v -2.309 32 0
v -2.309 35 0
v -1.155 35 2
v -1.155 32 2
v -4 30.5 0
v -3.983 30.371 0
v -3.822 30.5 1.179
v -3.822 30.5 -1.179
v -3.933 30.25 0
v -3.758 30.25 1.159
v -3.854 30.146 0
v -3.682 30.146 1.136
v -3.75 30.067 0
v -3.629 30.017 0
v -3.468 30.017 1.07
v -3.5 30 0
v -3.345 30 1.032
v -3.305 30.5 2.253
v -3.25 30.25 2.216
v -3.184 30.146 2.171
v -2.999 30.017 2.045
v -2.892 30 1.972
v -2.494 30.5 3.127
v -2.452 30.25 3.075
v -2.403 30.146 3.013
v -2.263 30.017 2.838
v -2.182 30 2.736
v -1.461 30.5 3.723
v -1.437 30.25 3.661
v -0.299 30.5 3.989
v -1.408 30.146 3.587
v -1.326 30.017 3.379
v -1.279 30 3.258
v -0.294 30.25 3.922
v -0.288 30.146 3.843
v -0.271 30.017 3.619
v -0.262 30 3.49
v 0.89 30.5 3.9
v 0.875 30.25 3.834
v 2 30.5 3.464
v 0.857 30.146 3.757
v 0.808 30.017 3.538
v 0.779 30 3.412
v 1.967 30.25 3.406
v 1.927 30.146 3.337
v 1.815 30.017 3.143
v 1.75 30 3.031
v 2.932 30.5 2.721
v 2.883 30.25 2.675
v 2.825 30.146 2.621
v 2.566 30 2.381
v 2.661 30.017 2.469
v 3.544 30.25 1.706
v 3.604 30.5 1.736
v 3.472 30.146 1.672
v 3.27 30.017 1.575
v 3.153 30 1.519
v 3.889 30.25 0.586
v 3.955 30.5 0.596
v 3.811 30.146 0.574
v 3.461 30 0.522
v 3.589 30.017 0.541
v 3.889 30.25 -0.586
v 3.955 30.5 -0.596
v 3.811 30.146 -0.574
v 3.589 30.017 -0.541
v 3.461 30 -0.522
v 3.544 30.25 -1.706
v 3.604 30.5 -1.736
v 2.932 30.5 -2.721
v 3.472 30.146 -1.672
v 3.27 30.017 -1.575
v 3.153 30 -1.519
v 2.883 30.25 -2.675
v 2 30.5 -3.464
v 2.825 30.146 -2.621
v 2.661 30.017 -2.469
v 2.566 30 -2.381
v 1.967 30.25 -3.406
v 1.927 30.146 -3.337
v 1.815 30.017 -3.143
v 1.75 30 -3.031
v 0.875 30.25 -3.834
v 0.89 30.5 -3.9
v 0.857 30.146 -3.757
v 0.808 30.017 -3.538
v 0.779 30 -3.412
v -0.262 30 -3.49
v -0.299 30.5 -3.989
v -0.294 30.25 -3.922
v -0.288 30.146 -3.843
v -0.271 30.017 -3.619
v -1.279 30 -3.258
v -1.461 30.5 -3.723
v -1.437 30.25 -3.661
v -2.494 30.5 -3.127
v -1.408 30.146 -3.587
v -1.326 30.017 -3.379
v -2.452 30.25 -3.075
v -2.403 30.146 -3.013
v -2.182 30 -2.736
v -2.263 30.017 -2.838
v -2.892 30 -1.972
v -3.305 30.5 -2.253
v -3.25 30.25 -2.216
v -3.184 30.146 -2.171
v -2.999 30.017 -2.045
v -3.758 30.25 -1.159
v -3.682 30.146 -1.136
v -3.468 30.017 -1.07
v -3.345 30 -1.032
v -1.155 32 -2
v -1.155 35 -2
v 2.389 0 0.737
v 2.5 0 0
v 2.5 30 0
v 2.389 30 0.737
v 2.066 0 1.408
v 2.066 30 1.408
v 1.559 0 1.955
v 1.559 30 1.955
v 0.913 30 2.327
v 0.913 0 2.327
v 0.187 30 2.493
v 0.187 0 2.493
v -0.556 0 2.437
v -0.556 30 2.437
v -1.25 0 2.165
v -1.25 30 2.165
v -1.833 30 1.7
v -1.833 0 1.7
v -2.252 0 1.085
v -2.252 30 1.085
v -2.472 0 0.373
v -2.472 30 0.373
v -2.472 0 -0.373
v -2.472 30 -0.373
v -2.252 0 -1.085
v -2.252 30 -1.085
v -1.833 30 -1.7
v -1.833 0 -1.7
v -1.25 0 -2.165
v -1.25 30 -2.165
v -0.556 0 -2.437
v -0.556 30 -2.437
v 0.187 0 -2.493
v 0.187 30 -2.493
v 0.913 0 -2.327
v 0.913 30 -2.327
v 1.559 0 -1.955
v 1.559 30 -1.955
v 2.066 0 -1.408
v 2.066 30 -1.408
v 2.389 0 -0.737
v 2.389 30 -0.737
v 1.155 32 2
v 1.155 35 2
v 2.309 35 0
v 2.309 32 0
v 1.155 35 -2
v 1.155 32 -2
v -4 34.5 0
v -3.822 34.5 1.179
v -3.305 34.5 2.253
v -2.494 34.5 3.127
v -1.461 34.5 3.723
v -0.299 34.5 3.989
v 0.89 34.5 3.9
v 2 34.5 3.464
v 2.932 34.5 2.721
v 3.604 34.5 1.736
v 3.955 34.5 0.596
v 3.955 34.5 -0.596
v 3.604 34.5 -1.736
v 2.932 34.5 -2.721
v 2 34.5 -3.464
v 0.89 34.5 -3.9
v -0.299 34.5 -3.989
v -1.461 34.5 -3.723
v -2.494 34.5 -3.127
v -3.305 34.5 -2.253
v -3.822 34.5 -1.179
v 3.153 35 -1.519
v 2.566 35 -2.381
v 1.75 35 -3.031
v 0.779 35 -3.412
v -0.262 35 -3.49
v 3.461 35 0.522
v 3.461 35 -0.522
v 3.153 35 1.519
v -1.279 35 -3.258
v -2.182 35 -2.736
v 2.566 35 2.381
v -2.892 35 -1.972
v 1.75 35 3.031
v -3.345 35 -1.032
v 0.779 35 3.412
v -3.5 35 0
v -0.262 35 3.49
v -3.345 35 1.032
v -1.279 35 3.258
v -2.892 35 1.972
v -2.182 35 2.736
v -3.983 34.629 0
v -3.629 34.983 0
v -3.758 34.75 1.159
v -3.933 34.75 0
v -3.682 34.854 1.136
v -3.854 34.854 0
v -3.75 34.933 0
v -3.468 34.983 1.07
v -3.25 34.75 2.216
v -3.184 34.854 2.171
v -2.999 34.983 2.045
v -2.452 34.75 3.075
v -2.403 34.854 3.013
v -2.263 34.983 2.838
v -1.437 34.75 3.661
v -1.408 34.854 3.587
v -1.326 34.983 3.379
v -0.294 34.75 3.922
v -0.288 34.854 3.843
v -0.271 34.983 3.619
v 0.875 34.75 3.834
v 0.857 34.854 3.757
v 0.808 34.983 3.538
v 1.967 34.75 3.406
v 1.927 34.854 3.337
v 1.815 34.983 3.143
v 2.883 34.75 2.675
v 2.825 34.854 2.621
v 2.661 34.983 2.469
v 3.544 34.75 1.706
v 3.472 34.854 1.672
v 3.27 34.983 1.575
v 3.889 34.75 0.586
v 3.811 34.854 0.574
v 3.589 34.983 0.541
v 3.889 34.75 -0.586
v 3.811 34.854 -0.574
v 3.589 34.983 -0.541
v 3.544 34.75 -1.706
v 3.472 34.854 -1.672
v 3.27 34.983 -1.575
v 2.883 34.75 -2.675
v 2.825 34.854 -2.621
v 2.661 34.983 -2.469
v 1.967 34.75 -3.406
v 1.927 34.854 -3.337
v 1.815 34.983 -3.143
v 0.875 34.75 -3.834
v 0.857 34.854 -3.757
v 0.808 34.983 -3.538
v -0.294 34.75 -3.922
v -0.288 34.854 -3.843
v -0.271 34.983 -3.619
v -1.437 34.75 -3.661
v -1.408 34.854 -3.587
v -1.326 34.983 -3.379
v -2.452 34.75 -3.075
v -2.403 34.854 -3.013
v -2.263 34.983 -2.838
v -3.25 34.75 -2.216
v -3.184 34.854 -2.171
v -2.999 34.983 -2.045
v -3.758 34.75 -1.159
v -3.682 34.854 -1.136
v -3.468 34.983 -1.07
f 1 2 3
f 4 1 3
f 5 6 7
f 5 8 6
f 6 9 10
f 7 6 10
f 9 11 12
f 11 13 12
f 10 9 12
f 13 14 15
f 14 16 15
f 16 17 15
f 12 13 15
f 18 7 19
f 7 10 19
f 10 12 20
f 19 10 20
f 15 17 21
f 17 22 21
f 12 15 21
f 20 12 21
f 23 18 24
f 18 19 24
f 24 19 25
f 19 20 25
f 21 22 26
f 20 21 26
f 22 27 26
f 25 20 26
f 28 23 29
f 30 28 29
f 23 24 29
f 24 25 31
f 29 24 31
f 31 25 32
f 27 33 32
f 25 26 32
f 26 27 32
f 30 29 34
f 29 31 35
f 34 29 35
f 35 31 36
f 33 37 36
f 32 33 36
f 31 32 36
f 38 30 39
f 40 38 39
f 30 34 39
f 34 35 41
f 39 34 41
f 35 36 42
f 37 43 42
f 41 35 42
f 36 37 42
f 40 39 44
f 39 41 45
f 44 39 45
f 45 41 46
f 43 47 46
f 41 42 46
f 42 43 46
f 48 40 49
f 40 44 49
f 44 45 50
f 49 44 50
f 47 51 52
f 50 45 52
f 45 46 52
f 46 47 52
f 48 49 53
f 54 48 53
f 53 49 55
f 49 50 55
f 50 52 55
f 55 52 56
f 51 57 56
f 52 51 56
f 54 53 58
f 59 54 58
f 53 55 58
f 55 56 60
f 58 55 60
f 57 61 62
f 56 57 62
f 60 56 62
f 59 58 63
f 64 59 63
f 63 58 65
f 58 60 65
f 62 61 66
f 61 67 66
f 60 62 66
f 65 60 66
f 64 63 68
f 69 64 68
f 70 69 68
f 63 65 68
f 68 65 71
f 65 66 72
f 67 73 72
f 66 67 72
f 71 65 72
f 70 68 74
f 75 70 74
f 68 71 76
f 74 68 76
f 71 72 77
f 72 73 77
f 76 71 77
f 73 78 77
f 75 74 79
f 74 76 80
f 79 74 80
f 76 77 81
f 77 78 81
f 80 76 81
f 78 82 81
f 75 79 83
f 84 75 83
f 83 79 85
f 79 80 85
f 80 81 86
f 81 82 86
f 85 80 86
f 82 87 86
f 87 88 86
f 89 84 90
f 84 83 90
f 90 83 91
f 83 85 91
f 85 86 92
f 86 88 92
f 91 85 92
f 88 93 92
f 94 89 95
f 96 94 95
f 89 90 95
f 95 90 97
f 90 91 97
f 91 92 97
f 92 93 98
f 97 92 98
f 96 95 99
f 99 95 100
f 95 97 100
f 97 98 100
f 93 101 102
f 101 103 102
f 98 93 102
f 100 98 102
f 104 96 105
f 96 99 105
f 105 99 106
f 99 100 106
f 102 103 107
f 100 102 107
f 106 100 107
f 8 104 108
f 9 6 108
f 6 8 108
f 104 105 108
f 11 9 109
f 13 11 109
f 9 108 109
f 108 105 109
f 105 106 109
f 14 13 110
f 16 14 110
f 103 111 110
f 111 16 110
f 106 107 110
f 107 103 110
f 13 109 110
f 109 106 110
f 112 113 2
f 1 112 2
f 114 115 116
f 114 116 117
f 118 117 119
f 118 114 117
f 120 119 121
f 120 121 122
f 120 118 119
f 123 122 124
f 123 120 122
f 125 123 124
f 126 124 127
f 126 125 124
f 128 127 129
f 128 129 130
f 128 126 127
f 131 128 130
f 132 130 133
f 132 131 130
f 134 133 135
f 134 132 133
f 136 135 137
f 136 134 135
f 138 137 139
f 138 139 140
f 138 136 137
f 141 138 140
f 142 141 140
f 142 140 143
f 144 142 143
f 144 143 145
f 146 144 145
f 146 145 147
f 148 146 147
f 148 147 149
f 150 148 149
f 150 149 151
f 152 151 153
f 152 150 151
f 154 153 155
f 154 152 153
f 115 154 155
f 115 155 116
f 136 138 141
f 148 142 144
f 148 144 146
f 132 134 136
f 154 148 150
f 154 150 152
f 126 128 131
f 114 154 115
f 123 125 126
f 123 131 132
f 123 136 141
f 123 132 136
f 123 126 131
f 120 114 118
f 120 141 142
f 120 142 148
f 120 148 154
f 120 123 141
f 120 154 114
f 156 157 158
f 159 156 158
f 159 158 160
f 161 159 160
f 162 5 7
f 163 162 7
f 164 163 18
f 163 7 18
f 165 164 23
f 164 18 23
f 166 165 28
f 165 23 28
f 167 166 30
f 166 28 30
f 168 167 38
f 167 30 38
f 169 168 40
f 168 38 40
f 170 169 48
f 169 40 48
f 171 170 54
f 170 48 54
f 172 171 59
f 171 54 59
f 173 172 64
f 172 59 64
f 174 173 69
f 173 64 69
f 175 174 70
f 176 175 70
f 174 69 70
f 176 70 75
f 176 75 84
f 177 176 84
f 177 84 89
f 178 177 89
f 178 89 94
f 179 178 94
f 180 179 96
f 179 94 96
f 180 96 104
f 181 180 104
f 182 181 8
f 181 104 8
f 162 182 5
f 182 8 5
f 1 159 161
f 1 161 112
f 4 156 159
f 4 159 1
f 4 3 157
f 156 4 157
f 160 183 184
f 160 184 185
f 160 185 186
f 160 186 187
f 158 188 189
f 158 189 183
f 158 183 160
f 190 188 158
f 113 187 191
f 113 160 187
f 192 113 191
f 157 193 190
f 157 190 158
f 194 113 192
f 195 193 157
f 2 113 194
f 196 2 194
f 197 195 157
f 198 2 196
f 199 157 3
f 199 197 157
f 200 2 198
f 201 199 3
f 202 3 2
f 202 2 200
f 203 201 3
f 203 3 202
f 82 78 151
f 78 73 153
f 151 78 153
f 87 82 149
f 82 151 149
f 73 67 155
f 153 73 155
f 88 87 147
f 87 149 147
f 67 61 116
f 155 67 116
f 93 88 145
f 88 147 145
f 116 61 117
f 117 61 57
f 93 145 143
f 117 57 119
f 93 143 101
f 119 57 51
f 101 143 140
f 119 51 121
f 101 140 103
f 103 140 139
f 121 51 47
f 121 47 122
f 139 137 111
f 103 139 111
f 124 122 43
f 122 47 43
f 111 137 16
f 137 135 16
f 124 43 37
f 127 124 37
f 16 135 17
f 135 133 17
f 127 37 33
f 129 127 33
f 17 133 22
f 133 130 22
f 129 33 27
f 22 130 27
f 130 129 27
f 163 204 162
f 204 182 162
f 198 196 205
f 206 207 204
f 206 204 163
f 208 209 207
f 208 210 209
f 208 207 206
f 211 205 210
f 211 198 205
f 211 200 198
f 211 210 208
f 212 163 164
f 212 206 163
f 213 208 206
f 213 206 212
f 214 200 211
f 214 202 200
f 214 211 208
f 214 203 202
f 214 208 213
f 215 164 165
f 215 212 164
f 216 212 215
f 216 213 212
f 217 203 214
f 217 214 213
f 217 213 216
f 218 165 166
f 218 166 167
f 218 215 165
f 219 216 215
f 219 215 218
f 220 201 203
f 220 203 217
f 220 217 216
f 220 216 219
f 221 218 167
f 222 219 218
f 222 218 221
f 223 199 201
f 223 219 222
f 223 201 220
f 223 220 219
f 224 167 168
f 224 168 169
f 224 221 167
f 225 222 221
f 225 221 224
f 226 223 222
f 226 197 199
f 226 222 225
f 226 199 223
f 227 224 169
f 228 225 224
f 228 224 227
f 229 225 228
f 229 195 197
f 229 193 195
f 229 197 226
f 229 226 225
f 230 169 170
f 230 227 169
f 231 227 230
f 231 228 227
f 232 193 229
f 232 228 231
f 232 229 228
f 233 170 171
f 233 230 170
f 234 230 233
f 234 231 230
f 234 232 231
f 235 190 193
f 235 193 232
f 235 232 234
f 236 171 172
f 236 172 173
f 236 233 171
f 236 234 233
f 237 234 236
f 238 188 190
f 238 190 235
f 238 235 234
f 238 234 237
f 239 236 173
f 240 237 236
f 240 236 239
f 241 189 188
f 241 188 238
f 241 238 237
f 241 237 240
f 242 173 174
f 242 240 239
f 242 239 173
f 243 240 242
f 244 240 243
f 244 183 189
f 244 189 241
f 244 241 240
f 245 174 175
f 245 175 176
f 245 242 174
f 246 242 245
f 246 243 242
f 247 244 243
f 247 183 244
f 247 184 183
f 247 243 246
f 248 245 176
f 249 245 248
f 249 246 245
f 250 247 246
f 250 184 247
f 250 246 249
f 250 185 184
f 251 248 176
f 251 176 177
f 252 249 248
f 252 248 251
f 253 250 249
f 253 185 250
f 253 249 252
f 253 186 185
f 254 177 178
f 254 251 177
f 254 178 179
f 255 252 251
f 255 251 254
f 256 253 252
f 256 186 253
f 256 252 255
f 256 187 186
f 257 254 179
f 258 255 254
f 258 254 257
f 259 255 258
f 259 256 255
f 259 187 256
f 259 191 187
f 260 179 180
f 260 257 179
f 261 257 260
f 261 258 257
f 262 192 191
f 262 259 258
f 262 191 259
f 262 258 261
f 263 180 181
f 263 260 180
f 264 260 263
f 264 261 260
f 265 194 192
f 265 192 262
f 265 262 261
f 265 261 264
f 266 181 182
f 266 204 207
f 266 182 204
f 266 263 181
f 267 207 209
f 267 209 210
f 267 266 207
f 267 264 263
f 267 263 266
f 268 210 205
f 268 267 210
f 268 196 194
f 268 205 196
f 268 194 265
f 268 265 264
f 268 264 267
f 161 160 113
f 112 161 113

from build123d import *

# Parameters (mm, degrees)
F0_R     = 2.5
F1_DEPTH = 30
F2_R     = 4
F3_DEPTH = 5
F4_R     = 0.5
F6_DEPTH = 3


with BuildPart() as f1:
    # F0 (on Front) → F1 (new body)
    with BuildSketch(Plane.XZ):
        Circle(F0_R)
    extrude(amount=-F1_DEPTH)

    # F2 (on face) → F3 (join)
    with BuildSketch(Plane(origin=(0, 30, 0), x_dir=(-1, 0, 0), z_dir=(0, 1, 0))):
        Circle(F2_R)
    extrude(amount=F3_DEPTH)

    # F4
    f4_edges = [f1.edges().sort_by_distance(p)[0] for p in [
        (4, 30, 0),
        (4, 35, 0),
    ]]
    fillet(f4_edges, radius=F4_R)

    # F5 (on face) → F6 (cut)
    with BuildSketch(Plane(origin=(0, 35, 0), x_dir=(-1, 0, 0), z_dir=(0, 1, 0))):
        Polygon((1.154701, 2), (-1.154701, 2), (-2.309401, 0), (-1.154701, -2), (1.154701, -2), (2.309401, 0), align=None)
    extrude(amount=-F6_DEPTH, mode=Mode.SUBTRACT)


solid = f1.part
